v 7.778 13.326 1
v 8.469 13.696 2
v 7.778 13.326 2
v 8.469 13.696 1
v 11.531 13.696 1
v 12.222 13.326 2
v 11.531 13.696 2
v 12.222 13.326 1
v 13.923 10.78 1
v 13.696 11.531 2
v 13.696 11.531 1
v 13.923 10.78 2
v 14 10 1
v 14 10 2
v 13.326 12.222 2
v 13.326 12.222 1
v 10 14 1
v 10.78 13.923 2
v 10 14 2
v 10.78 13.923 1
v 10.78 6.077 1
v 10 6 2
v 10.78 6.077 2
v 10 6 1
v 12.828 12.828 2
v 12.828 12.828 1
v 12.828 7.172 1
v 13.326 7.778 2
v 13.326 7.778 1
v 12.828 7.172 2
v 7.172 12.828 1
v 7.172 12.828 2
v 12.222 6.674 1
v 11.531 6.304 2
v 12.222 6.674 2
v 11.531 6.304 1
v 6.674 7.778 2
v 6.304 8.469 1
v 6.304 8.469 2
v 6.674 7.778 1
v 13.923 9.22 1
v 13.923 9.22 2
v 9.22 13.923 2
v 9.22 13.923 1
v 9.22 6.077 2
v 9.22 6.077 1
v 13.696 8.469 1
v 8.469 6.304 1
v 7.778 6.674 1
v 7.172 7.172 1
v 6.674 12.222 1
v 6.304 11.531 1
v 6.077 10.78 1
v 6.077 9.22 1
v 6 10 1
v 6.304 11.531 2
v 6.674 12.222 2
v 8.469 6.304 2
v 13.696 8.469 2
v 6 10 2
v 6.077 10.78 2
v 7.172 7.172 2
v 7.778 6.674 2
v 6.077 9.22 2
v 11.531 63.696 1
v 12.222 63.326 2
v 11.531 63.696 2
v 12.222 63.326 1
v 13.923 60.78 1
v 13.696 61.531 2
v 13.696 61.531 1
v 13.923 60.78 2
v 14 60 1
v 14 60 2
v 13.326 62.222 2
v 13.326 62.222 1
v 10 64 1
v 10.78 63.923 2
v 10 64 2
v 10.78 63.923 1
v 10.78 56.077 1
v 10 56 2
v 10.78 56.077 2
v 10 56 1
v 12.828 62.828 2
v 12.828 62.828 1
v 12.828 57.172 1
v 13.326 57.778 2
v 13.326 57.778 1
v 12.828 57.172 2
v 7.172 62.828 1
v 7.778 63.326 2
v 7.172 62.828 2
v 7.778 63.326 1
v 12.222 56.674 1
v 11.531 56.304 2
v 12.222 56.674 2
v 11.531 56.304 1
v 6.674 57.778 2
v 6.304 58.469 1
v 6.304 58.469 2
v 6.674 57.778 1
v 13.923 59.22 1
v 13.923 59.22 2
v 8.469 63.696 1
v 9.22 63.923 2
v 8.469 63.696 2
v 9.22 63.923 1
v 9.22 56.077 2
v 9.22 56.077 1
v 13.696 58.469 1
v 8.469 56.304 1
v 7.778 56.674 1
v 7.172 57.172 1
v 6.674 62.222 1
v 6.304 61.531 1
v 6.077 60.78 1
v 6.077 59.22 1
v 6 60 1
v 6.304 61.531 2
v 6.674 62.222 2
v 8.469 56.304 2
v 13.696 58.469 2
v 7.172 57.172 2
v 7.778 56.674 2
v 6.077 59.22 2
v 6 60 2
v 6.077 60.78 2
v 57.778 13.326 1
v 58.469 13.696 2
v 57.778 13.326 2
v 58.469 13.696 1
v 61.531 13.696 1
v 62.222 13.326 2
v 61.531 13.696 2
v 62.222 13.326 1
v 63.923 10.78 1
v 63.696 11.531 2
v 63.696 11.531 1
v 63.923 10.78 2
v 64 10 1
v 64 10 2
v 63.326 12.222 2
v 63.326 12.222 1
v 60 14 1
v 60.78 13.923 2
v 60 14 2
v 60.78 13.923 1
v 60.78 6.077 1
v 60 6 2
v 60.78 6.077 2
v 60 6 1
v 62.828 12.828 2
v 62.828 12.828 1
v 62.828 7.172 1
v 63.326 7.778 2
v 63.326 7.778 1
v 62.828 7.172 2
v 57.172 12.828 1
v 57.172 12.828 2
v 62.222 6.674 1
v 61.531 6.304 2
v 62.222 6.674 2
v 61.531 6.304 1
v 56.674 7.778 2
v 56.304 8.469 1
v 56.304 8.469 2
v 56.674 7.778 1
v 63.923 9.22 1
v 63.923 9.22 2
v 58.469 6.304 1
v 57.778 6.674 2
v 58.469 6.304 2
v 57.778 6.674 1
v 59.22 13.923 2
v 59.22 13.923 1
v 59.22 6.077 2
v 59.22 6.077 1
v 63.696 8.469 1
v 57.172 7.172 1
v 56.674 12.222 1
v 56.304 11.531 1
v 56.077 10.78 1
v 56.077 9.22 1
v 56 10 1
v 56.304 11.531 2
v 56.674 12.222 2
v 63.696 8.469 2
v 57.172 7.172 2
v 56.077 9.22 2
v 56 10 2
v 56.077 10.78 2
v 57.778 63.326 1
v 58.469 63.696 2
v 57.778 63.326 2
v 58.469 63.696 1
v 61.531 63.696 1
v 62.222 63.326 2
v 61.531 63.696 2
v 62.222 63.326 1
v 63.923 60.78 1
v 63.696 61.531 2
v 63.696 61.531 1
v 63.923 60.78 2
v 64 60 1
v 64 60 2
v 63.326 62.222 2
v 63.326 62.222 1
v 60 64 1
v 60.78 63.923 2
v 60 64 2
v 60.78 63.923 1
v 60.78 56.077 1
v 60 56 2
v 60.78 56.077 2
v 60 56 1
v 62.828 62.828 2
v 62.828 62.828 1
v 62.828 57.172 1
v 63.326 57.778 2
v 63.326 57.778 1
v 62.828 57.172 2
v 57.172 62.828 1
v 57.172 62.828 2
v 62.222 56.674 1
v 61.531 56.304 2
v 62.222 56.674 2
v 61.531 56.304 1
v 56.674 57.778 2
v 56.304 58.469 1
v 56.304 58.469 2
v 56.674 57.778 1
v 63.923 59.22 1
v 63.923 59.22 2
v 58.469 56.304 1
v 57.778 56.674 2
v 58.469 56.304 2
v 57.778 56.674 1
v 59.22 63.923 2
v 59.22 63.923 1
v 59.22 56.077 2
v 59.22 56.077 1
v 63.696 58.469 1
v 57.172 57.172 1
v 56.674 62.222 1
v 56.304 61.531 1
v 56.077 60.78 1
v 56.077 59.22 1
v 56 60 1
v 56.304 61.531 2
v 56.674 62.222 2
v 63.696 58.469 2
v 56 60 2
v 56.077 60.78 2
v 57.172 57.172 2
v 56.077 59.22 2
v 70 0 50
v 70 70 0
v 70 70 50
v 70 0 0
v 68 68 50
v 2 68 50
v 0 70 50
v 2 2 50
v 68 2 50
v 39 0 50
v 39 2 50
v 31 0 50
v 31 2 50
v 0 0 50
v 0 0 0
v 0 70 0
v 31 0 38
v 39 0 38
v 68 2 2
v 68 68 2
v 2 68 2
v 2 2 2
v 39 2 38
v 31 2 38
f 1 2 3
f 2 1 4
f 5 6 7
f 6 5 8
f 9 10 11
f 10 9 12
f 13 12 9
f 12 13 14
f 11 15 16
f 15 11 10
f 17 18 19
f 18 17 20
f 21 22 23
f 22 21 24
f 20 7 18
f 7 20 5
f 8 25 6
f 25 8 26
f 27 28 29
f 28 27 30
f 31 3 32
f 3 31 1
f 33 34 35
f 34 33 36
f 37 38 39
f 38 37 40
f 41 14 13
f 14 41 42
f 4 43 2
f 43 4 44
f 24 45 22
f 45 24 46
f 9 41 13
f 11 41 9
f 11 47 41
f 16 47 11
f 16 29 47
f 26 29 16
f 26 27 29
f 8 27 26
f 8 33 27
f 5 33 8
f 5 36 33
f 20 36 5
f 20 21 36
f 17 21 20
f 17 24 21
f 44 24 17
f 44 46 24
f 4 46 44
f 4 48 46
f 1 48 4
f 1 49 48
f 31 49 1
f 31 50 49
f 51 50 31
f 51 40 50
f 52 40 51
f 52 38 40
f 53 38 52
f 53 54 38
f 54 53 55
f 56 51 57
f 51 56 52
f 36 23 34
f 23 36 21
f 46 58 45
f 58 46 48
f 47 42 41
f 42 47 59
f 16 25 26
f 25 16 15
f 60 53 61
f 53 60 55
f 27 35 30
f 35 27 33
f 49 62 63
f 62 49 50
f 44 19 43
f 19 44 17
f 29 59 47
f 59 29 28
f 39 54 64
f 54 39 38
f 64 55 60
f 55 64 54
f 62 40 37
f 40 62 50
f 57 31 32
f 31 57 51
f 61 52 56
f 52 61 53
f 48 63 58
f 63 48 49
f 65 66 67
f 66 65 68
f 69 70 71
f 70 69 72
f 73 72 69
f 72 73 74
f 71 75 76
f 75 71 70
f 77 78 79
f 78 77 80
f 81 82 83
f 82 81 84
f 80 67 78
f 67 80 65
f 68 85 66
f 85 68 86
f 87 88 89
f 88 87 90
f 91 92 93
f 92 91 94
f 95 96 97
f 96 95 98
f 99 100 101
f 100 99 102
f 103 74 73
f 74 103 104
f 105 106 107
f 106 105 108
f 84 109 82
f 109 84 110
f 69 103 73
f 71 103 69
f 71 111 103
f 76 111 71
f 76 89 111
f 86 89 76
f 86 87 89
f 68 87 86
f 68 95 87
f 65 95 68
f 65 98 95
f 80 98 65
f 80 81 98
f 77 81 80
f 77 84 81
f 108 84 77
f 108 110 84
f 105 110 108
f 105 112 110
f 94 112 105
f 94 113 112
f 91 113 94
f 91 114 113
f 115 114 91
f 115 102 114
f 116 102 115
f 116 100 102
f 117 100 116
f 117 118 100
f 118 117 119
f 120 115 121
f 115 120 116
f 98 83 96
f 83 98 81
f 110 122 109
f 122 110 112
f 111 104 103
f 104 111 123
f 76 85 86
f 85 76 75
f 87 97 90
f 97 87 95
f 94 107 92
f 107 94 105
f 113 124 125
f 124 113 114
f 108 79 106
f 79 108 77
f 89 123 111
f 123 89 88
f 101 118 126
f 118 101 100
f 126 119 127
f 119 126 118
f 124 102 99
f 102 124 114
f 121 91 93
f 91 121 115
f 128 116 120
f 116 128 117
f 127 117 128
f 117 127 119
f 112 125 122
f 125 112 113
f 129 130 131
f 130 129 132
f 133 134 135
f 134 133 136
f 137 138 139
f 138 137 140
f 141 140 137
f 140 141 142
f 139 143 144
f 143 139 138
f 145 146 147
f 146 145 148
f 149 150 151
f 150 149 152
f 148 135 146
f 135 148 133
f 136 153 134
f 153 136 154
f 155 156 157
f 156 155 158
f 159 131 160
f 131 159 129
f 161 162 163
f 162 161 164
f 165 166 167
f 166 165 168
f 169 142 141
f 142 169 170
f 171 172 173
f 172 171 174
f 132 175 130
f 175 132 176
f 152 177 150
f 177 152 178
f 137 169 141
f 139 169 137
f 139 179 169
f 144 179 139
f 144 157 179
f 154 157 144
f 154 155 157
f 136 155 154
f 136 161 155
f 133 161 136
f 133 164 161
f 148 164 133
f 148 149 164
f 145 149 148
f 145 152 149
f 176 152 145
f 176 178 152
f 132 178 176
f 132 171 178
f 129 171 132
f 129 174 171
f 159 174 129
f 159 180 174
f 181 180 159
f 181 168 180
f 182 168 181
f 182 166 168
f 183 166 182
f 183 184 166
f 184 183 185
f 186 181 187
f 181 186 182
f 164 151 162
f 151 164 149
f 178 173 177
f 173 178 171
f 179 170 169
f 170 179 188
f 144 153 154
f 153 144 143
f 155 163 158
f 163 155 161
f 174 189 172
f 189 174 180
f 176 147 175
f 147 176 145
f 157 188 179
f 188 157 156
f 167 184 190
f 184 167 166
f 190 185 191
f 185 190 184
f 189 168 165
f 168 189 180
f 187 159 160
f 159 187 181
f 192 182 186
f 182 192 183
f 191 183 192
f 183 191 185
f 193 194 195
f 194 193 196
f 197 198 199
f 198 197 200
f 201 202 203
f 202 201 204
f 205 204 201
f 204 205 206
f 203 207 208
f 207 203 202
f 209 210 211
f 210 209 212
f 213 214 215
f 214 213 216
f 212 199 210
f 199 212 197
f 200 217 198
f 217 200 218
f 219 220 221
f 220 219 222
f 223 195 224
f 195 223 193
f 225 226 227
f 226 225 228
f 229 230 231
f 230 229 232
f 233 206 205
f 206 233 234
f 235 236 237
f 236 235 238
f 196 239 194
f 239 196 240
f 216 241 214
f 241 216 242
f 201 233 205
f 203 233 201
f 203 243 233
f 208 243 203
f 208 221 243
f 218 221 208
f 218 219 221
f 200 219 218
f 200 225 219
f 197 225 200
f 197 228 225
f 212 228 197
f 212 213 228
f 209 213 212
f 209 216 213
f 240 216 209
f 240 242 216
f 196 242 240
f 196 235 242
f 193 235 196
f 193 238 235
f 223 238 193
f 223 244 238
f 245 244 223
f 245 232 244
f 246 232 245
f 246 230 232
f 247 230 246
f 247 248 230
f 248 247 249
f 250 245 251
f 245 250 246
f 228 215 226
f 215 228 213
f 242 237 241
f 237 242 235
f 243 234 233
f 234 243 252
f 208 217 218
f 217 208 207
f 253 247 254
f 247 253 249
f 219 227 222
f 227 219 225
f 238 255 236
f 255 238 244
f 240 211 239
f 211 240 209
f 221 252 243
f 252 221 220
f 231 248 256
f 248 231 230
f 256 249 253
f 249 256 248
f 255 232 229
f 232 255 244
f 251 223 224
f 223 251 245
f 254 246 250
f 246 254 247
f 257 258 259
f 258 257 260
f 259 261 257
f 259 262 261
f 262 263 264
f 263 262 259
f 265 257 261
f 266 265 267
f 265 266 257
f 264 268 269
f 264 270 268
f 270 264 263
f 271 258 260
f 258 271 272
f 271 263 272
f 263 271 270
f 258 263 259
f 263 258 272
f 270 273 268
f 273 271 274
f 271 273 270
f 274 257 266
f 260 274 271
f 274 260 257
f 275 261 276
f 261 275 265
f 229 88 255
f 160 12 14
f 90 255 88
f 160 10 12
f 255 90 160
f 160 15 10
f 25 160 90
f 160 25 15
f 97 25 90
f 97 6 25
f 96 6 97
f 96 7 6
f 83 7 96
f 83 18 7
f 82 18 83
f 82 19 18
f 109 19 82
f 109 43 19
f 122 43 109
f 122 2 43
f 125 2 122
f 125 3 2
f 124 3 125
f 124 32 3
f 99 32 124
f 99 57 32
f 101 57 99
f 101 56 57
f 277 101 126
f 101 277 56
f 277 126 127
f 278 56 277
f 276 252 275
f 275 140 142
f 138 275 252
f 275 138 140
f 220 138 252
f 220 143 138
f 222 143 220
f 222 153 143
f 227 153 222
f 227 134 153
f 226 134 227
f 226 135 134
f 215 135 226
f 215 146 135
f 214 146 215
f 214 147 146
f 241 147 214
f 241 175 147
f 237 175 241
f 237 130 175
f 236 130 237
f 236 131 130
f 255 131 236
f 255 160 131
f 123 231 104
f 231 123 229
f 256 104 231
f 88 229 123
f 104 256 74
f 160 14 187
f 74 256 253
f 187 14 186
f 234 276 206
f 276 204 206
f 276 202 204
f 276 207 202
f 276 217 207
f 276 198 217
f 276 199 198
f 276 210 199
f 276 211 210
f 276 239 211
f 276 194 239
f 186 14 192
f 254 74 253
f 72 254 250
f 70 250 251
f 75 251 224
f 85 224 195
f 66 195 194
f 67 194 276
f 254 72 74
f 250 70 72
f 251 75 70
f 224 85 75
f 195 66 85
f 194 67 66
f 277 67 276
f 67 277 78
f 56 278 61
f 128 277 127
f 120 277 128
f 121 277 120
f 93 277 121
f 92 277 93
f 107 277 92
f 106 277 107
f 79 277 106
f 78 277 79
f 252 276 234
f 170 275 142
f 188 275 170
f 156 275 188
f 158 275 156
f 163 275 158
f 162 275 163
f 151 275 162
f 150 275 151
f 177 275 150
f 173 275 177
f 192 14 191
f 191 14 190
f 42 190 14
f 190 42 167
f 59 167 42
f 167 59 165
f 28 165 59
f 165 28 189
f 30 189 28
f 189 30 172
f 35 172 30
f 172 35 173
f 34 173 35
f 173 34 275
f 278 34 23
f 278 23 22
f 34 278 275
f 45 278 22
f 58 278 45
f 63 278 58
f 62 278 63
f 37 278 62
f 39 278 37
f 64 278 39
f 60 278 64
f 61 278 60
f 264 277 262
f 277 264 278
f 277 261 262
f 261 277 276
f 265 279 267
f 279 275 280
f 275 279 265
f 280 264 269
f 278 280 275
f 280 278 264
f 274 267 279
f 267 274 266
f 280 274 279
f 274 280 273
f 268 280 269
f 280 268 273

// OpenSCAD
$fn = 32;

// ----------------------------------------------------------------------
// Enclosure box: both enclosure
// ----------------------------------------------------------------------

// --- parameters (mm) ---
box_l = 70;               // outer length, X
box_w = 70;               // outer width, Y
box_h = 50;               // outer height
wall_t = 2;               // wall thickness
boss_r = 4;               // corner boss radius
hole_r = 2;               // boss screw hole radius
boss_in = 10;             // boss inset from the corners
notch_w = 8;              // cable notch width
notch_h = 12;             // cable notch height

inner_h = box_h - wall_t;  // cavity depth
boss_h = inner_h - 2;  // corner boss height

difference() {
  cube([box_l, box_w, box_h]);
  translate([wall_t, wall_t, wall_t])
    cube([box_l - 2 * wall_t, box_w - 2 * wall_t, box_h]);
  for (sx = [0, 1], sy = [0, 1])
    translate([sx ? box_l - boss_in : boss_in,
               sy ? box_w - boss_in : boss_in, wall_t - 1]) {
      cylinder(r = boss_r, h = boss_h);
      translate([0, 0, boss_h - 4])
        cylinder(r = hole_r, h = 5);
    }
  translate([box_l / 2 - notch_w / 2, -1, box_h - notch_h])
    cube([notch_w, wall_t + 2, notch_h + 1]);
}
